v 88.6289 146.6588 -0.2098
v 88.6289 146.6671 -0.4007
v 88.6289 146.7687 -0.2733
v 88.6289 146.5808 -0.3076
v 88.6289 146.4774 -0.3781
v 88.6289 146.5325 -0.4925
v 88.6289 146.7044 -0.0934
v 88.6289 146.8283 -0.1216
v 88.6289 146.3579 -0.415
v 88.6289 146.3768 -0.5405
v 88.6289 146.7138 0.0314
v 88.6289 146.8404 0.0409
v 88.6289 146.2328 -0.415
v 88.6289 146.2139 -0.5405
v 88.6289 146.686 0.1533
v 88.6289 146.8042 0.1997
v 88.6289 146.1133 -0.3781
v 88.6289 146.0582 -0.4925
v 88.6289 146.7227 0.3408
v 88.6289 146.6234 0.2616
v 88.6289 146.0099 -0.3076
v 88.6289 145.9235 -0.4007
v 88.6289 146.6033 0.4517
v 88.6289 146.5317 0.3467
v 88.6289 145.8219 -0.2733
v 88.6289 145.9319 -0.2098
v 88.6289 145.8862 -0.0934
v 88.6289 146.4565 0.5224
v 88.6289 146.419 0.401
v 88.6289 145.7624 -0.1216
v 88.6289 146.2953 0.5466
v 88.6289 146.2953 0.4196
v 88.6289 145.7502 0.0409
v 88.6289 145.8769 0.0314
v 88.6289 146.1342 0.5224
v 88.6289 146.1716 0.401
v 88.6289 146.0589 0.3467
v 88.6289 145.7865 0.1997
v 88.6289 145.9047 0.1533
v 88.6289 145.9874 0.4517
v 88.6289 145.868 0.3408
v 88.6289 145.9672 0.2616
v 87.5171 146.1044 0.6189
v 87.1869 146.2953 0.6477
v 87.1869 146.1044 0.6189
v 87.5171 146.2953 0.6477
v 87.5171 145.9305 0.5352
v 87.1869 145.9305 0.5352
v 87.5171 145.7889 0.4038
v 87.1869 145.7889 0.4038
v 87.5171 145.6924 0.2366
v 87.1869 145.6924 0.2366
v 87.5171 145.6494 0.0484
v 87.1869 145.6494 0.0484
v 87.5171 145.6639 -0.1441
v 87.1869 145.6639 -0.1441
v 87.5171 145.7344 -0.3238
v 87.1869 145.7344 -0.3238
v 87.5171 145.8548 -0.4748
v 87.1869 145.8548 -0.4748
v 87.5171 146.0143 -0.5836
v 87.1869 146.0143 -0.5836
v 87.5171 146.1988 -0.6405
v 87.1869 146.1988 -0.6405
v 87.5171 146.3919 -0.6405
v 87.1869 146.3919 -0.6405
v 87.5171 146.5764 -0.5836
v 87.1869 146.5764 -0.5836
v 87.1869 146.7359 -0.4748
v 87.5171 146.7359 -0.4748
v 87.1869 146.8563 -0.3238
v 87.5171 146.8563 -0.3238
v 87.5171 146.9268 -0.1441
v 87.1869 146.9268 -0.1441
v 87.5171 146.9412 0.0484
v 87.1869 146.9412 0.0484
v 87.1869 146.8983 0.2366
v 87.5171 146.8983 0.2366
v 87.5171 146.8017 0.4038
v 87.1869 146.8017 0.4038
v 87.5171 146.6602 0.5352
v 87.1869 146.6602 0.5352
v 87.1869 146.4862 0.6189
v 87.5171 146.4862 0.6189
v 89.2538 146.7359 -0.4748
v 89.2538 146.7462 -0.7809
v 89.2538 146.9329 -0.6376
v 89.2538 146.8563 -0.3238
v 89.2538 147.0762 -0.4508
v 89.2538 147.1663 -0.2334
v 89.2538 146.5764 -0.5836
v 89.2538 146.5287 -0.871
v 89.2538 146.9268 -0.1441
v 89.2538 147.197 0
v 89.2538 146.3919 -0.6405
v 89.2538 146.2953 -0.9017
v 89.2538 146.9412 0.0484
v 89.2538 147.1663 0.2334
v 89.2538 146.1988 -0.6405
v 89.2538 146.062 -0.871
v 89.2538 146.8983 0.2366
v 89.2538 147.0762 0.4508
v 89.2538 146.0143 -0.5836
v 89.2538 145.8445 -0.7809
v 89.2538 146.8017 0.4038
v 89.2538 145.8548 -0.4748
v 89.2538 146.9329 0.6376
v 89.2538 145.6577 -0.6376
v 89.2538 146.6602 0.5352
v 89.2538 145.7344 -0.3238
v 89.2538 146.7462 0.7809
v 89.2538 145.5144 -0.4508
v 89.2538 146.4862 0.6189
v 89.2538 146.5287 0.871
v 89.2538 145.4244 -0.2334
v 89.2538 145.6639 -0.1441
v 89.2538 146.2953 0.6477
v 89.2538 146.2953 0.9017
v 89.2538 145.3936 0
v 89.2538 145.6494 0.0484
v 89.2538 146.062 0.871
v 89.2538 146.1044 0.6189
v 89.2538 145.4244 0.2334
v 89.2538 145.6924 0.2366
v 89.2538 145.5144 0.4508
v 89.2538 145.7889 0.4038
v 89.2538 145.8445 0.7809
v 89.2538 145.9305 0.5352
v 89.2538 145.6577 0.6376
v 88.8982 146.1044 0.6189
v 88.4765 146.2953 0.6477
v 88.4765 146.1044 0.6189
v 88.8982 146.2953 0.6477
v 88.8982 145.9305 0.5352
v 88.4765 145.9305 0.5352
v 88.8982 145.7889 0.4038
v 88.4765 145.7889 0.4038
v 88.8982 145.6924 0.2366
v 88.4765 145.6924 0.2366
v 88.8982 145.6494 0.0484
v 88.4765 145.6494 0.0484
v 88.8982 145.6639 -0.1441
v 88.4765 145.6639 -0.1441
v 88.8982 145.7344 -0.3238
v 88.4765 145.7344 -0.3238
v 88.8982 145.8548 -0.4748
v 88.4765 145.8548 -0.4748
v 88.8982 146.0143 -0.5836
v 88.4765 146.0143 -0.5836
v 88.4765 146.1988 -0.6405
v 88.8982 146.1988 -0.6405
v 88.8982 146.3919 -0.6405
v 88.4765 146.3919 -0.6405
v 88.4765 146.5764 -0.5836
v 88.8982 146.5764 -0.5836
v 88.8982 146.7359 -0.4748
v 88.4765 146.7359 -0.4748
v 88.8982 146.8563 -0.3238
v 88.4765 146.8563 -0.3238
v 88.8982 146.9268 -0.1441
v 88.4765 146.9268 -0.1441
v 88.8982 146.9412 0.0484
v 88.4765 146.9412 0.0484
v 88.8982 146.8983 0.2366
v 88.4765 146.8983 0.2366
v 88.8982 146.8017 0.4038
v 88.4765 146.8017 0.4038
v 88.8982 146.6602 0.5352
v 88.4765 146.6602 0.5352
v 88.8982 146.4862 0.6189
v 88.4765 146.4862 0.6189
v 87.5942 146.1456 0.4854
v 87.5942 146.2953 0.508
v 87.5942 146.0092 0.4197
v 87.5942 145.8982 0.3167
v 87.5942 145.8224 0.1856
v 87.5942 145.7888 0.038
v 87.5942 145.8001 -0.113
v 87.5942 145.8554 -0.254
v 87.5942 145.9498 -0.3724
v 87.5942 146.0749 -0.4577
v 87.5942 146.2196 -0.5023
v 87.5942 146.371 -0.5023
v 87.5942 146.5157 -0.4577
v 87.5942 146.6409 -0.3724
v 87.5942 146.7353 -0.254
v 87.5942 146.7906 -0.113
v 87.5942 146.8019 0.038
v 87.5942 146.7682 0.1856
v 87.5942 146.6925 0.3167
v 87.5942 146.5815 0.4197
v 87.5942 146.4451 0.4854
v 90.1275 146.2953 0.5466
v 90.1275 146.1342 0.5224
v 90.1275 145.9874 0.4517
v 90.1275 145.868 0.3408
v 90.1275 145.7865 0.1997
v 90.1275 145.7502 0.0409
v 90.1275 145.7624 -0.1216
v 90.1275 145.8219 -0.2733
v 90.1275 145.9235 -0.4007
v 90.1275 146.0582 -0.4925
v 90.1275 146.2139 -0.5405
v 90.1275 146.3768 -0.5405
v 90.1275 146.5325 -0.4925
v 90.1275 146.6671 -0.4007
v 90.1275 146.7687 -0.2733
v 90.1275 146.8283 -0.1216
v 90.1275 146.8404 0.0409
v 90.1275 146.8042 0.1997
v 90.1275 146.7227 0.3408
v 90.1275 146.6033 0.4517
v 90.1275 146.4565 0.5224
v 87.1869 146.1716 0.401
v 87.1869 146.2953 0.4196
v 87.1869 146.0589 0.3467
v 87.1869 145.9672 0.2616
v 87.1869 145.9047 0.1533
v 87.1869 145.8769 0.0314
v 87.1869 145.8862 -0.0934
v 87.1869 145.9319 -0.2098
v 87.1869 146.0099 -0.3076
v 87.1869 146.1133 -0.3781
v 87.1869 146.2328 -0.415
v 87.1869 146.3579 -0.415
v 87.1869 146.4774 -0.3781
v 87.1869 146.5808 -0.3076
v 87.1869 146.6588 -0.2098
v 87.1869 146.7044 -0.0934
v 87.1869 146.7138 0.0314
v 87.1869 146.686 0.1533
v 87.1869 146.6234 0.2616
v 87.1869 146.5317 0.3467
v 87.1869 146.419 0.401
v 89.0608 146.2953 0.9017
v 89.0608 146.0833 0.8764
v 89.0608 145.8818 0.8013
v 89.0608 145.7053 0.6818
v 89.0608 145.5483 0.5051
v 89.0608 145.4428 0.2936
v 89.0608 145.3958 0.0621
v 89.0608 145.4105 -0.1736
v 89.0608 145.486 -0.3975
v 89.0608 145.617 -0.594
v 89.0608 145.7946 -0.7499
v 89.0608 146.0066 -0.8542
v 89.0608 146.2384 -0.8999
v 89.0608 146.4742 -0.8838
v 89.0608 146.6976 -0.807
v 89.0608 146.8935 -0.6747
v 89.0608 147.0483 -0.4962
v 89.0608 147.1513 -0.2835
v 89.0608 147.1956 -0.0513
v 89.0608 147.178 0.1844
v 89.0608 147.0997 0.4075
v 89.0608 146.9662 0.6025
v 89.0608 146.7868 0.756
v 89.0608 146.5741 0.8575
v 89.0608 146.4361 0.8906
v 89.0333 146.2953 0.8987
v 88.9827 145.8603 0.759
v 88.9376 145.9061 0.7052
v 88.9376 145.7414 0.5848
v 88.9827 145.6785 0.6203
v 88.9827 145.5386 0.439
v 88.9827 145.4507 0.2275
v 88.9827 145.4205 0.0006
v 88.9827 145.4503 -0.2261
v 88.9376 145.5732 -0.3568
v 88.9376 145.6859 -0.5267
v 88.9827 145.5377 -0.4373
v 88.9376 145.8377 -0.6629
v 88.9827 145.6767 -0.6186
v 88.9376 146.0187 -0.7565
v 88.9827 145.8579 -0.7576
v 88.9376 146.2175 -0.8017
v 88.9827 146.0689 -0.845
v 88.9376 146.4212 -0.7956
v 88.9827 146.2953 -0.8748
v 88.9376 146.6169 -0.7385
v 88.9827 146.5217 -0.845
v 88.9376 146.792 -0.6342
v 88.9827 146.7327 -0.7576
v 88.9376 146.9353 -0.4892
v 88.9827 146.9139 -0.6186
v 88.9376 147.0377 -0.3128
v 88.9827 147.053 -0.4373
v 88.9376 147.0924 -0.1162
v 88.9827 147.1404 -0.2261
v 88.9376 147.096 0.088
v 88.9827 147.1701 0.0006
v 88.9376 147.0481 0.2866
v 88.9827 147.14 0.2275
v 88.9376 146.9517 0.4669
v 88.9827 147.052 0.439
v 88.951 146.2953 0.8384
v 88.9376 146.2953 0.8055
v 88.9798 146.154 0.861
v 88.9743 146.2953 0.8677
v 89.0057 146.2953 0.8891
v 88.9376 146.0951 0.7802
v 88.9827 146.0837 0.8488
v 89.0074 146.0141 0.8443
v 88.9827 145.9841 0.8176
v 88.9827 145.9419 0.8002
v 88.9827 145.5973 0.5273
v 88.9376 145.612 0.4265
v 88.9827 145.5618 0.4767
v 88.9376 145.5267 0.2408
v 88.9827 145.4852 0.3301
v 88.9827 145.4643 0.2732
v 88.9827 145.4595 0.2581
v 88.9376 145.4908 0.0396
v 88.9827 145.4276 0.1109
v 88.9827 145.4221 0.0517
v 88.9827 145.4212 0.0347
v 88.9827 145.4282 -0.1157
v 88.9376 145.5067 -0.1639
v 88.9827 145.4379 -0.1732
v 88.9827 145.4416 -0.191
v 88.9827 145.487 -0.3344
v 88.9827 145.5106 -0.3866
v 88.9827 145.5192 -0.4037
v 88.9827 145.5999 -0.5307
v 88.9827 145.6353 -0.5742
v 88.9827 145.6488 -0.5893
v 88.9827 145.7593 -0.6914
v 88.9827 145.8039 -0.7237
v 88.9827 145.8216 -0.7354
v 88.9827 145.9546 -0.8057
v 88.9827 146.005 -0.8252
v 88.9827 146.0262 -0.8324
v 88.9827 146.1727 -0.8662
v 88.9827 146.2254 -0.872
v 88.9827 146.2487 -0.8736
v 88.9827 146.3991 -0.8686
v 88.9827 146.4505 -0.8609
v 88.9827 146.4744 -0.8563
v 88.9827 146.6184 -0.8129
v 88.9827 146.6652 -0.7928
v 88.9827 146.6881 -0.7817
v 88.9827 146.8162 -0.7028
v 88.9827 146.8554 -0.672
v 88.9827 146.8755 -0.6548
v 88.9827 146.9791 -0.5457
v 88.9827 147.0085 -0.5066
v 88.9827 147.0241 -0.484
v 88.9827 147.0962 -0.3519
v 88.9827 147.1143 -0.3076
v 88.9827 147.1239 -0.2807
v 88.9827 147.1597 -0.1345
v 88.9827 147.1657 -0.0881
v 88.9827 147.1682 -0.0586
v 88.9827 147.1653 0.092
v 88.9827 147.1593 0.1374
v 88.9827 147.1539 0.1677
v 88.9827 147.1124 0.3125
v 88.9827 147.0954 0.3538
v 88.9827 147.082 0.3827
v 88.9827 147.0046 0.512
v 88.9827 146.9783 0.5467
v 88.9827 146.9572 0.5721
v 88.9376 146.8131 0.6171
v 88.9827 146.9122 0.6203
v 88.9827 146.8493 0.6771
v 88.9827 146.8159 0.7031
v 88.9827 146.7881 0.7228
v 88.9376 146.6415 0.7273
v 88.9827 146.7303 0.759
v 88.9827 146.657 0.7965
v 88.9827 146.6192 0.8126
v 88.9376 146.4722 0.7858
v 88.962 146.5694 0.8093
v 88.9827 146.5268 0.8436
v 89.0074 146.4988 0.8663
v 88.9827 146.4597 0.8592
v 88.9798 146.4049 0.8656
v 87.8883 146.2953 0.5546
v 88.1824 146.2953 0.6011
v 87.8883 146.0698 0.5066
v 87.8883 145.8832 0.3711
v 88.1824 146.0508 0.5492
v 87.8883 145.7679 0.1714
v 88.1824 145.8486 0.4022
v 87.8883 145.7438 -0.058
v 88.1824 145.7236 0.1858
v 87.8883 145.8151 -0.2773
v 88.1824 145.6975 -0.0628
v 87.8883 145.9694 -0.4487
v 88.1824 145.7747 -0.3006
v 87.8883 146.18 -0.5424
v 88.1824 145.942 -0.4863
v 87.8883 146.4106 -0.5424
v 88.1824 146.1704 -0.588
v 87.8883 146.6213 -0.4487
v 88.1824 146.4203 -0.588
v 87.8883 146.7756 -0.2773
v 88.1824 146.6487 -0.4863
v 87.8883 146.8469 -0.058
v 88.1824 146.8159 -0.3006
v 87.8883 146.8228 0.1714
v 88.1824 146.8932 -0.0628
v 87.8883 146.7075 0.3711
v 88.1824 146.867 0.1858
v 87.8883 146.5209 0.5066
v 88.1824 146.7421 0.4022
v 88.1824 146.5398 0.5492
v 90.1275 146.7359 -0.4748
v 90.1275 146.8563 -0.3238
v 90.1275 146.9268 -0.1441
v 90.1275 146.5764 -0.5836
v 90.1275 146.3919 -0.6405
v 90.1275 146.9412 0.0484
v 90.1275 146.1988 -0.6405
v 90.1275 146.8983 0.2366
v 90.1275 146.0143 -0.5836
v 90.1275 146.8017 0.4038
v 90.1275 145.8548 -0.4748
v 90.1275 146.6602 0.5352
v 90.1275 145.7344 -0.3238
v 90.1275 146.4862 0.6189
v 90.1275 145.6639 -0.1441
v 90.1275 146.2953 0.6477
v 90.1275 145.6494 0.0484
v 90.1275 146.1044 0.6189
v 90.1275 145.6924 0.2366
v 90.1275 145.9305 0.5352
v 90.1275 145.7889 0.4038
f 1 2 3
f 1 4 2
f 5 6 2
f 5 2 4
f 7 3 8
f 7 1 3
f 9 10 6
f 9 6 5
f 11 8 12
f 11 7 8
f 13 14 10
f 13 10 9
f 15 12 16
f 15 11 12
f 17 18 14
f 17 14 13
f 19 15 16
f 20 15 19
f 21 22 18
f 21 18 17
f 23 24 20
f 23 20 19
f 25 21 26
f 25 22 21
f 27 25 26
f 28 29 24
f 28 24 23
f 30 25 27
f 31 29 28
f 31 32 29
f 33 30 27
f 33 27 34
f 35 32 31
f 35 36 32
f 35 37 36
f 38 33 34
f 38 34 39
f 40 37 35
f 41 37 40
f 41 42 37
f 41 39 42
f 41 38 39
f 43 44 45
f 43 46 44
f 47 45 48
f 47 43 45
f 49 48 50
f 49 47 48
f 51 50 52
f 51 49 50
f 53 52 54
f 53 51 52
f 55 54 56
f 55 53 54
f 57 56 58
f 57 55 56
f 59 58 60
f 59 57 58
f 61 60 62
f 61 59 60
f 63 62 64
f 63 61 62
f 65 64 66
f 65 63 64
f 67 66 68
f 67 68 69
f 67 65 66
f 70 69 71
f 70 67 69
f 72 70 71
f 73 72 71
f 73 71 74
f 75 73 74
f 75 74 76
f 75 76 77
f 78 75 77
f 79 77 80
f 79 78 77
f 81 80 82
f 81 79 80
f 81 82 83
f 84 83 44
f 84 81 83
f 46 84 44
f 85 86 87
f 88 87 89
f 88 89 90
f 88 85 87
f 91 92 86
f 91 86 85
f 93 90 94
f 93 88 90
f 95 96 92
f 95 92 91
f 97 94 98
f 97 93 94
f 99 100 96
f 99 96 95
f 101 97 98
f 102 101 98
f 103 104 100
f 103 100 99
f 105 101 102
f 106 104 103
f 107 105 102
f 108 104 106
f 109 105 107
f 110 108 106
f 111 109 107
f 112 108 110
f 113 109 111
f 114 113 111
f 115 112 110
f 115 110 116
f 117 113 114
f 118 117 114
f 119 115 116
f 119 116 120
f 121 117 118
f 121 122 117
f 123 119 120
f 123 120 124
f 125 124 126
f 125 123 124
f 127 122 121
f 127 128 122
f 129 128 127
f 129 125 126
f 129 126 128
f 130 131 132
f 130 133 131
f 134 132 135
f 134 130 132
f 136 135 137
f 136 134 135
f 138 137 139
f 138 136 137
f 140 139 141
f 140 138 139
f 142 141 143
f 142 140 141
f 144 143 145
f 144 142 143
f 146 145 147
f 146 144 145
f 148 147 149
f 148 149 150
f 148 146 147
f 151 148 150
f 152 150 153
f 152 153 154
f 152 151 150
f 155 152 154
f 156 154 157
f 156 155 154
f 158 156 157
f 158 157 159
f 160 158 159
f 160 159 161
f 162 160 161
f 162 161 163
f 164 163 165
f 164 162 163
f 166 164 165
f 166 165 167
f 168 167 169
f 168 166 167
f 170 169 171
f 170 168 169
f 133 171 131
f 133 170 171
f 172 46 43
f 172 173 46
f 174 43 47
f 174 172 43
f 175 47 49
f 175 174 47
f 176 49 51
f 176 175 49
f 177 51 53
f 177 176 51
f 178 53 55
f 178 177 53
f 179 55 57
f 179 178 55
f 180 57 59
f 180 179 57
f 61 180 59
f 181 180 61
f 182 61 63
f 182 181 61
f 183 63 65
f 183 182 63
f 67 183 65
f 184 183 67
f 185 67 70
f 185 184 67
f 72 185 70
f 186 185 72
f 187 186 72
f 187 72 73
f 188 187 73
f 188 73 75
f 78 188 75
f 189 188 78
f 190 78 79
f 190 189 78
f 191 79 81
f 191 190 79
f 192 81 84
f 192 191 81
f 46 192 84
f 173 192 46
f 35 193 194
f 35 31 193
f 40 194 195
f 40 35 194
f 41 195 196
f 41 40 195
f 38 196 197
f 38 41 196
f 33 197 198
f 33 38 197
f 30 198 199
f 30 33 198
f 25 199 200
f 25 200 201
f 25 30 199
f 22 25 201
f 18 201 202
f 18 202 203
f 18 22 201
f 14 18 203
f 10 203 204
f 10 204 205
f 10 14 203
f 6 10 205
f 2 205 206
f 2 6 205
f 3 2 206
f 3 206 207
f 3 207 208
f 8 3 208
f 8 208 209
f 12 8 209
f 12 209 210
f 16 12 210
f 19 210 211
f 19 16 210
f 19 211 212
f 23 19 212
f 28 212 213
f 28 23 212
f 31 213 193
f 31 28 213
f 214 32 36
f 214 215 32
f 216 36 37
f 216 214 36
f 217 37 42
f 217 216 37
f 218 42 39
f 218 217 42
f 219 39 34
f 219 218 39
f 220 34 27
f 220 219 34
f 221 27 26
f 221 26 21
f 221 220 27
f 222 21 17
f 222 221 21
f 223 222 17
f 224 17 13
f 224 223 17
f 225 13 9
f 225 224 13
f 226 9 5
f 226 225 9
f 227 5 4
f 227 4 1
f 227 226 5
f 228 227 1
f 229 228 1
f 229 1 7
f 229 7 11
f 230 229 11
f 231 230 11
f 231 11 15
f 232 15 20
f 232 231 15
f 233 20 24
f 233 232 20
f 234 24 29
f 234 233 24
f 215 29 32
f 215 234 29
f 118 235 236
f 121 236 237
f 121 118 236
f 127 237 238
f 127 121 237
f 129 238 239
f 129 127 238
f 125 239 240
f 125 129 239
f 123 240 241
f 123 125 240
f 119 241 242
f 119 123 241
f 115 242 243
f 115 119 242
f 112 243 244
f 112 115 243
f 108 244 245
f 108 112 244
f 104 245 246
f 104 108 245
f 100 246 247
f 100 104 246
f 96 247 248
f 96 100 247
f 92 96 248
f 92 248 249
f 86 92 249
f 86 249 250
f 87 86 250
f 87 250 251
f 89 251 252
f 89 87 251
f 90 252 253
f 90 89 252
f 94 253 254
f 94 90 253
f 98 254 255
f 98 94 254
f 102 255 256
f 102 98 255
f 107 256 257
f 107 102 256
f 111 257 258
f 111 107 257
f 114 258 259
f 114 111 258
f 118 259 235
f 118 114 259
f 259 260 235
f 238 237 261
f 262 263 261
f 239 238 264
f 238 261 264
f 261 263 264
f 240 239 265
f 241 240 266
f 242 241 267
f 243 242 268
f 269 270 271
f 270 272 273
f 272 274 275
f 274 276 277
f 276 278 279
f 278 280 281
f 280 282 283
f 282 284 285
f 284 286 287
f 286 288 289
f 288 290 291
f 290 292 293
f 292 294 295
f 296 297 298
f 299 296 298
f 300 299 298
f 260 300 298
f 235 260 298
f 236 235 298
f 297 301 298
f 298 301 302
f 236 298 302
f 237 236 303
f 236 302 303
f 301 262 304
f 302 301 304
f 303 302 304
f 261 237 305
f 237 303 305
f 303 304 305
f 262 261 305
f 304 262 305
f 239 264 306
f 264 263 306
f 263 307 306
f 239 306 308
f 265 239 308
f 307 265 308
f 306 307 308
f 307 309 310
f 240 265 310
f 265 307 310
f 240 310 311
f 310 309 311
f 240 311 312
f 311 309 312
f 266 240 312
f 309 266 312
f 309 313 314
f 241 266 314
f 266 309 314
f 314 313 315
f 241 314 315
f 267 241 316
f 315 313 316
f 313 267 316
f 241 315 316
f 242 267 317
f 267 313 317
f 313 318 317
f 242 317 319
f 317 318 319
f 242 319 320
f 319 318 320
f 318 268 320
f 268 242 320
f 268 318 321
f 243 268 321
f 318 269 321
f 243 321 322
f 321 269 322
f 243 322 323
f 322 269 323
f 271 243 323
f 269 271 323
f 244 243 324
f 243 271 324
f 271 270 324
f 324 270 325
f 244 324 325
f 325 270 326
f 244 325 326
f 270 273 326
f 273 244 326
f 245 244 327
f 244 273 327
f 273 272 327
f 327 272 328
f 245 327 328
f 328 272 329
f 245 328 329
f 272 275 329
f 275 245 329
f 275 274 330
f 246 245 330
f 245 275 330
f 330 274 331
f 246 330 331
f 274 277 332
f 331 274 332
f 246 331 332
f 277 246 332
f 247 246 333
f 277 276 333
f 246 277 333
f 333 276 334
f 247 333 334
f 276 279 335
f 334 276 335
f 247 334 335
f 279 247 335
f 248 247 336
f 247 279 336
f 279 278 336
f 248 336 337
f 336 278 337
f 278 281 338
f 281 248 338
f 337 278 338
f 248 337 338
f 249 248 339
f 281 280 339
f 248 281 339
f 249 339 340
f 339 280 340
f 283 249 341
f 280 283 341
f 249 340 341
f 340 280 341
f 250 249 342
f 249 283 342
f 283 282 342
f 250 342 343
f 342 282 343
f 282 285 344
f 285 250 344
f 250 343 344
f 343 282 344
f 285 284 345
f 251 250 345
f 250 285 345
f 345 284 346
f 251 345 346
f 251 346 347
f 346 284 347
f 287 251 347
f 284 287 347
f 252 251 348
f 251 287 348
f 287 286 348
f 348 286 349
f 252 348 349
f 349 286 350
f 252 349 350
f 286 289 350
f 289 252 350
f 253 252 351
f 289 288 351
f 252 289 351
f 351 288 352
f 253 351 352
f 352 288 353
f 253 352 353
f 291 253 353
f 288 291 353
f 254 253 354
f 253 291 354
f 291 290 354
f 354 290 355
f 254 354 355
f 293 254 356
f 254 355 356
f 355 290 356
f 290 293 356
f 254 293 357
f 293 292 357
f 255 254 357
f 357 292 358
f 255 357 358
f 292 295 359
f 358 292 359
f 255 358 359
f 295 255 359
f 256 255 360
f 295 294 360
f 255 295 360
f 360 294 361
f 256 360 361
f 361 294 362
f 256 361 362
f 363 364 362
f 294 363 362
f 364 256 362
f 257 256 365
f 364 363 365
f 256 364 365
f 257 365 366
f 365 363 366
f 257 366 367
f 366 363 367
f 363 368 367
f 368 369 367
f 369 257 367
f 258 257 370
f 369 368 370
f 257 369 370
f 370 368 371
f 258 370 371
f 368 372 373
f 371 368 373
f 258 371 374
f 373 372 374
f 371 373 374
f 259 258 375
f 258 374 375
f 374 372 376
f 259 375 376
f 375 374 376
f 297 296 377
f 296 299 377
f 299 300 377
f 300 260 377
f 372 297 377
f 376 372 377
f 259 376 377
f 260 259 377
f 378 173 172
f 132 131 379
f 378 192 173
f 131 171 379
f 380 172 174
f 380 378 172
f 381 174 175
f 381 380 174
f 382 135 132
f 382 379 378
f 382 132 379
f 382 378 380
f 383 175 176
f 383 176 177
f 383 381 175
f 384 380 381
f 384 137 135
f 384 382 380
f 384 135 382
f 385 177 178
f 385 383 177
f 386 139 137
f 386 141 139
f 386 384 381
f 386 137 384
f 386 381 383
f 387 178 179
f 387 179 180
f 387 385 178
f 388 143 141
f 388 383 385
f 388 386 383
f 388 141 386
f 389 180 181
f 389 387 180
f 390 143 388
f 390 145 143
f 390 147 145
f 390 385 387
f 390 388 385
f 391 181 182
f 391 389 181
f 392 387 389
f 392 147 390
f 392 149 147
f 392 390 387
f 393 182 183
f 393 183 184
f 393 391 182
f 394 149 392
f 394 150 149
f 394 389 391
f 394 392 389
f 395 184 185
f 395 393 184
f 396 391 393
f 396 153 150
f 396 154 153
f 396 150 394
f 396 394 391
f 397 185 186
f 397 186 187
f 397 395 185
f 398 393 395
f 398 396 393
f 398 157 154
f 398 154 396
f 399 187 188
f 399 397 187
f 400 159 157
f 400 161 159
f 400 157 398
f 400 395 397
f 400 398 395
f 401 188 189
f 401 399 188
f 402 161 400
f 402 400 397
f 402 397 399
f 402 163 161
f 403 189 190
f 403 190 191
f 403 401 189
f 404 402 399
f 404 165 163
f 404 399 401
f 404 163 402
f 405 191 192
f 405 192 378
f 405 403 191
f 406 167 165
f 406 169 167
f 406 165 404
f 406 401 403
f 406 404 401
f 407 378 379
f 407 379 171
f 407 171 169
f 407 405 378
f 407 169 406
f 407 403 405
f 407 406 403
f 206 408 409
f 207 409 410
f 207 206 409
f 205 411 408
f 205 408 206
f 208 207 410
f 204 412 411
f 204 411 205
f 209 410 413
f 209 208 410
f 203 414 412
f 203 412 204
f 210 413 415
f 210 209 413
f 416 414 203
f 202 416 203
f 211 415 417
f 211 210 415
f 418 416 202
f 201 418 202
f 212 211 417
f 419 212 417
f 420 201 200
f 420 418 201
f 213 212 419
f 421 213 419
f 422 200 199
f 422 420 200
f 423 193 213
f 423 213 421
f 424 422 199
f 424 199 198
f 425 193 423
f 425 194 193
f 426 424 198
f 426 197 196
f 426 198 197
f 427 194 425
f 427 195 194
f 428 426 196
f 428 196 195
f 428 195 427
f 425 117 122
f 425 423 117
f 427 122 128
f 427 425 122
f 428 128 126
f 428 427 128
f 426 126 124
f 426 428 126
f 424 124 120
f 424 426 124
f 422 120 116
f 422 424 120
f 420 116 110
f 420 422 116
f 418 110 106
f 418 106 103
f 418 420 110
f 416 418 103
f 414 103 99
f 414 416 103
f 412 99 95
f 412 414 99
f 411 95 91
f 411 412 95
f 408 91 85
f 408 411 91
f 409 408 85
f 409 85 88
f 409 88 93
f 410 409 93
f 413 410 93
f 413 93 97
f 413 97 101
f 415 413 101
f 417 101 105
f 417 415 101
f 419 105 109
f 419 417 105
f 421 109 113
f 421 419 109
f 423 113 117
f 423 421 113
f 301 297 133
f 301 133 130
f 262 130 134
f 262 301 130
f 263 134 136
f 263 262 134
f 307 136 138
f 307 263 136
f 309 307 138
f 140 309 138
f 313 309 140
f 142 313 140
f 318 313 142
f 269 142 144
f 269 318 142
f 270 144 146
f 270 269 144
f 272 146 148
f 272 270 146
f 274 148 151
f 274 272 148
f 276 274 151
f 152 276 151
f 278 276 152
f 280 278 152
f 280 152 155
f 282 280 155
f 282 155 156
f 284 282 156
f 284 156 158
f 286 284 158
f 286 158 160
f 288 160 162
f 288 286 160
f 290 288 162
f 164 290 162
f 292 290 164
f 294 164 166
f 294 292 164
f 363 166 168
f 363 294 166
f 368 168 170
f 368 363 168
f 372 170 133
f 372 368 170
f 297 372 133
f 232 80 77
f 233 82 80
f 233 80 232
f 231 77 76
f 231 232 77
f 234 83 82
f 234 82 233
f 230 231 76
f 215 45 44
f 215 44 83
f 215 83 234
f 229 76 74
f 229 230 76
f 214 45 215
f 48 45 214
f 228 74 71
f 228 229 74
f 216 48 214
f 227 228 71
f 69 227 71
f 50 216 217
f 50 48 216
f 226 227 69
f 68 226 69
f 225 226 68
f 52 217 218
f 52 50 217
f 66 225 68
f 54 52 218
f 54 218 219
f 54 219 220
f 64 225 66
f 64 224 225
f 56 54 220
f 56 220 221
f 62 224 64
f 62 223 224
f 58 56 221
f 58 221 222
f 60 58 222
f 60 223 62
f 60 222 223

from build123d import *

# Parameters (mm, degrees)
FILLET2_R = 0.127


with BuildPart() as part:
    # Sketch1 → Revolve1 (revolve)
    with BuildSketch(Plane.XY, mode=Mode.PRIVATE) as revolve1_sk:
        Polygon((88.476526811, 146.943032749), (88.898166811, 146.943032749), (88.961666811, 147.197032749), (89.253766811, 147.197032749), (89.253766811, 146.943032749), (90.127526811, 146.943032749), (90.127526811, 146.841971125), (88.628926811, 146.841971125), (88.628926811, 146.714971125), (87.186879843, 146.714971125), (87.186879843, 146.943032749), (87.517079843, 146.943032749), (87.594159764, 146.803332749), align=None)
    revolve(revolve1_sk.sketch.rotate(Axis((82.894279843, 146.295332749, 0), (1, 0, 0)), 90), axis=Axis((82.894279843, 146.295332749, 0), (1, 0, 0)))

    # Fillet2
    fillet2_edges = [part.edges().sort_by_distance(p)[0] for p in [
        (88.961666811, 146.295332749, -0.9017),
    ]]
    fillet(fillet2_edges, radius=FILLET2_R)


solid = part.part
